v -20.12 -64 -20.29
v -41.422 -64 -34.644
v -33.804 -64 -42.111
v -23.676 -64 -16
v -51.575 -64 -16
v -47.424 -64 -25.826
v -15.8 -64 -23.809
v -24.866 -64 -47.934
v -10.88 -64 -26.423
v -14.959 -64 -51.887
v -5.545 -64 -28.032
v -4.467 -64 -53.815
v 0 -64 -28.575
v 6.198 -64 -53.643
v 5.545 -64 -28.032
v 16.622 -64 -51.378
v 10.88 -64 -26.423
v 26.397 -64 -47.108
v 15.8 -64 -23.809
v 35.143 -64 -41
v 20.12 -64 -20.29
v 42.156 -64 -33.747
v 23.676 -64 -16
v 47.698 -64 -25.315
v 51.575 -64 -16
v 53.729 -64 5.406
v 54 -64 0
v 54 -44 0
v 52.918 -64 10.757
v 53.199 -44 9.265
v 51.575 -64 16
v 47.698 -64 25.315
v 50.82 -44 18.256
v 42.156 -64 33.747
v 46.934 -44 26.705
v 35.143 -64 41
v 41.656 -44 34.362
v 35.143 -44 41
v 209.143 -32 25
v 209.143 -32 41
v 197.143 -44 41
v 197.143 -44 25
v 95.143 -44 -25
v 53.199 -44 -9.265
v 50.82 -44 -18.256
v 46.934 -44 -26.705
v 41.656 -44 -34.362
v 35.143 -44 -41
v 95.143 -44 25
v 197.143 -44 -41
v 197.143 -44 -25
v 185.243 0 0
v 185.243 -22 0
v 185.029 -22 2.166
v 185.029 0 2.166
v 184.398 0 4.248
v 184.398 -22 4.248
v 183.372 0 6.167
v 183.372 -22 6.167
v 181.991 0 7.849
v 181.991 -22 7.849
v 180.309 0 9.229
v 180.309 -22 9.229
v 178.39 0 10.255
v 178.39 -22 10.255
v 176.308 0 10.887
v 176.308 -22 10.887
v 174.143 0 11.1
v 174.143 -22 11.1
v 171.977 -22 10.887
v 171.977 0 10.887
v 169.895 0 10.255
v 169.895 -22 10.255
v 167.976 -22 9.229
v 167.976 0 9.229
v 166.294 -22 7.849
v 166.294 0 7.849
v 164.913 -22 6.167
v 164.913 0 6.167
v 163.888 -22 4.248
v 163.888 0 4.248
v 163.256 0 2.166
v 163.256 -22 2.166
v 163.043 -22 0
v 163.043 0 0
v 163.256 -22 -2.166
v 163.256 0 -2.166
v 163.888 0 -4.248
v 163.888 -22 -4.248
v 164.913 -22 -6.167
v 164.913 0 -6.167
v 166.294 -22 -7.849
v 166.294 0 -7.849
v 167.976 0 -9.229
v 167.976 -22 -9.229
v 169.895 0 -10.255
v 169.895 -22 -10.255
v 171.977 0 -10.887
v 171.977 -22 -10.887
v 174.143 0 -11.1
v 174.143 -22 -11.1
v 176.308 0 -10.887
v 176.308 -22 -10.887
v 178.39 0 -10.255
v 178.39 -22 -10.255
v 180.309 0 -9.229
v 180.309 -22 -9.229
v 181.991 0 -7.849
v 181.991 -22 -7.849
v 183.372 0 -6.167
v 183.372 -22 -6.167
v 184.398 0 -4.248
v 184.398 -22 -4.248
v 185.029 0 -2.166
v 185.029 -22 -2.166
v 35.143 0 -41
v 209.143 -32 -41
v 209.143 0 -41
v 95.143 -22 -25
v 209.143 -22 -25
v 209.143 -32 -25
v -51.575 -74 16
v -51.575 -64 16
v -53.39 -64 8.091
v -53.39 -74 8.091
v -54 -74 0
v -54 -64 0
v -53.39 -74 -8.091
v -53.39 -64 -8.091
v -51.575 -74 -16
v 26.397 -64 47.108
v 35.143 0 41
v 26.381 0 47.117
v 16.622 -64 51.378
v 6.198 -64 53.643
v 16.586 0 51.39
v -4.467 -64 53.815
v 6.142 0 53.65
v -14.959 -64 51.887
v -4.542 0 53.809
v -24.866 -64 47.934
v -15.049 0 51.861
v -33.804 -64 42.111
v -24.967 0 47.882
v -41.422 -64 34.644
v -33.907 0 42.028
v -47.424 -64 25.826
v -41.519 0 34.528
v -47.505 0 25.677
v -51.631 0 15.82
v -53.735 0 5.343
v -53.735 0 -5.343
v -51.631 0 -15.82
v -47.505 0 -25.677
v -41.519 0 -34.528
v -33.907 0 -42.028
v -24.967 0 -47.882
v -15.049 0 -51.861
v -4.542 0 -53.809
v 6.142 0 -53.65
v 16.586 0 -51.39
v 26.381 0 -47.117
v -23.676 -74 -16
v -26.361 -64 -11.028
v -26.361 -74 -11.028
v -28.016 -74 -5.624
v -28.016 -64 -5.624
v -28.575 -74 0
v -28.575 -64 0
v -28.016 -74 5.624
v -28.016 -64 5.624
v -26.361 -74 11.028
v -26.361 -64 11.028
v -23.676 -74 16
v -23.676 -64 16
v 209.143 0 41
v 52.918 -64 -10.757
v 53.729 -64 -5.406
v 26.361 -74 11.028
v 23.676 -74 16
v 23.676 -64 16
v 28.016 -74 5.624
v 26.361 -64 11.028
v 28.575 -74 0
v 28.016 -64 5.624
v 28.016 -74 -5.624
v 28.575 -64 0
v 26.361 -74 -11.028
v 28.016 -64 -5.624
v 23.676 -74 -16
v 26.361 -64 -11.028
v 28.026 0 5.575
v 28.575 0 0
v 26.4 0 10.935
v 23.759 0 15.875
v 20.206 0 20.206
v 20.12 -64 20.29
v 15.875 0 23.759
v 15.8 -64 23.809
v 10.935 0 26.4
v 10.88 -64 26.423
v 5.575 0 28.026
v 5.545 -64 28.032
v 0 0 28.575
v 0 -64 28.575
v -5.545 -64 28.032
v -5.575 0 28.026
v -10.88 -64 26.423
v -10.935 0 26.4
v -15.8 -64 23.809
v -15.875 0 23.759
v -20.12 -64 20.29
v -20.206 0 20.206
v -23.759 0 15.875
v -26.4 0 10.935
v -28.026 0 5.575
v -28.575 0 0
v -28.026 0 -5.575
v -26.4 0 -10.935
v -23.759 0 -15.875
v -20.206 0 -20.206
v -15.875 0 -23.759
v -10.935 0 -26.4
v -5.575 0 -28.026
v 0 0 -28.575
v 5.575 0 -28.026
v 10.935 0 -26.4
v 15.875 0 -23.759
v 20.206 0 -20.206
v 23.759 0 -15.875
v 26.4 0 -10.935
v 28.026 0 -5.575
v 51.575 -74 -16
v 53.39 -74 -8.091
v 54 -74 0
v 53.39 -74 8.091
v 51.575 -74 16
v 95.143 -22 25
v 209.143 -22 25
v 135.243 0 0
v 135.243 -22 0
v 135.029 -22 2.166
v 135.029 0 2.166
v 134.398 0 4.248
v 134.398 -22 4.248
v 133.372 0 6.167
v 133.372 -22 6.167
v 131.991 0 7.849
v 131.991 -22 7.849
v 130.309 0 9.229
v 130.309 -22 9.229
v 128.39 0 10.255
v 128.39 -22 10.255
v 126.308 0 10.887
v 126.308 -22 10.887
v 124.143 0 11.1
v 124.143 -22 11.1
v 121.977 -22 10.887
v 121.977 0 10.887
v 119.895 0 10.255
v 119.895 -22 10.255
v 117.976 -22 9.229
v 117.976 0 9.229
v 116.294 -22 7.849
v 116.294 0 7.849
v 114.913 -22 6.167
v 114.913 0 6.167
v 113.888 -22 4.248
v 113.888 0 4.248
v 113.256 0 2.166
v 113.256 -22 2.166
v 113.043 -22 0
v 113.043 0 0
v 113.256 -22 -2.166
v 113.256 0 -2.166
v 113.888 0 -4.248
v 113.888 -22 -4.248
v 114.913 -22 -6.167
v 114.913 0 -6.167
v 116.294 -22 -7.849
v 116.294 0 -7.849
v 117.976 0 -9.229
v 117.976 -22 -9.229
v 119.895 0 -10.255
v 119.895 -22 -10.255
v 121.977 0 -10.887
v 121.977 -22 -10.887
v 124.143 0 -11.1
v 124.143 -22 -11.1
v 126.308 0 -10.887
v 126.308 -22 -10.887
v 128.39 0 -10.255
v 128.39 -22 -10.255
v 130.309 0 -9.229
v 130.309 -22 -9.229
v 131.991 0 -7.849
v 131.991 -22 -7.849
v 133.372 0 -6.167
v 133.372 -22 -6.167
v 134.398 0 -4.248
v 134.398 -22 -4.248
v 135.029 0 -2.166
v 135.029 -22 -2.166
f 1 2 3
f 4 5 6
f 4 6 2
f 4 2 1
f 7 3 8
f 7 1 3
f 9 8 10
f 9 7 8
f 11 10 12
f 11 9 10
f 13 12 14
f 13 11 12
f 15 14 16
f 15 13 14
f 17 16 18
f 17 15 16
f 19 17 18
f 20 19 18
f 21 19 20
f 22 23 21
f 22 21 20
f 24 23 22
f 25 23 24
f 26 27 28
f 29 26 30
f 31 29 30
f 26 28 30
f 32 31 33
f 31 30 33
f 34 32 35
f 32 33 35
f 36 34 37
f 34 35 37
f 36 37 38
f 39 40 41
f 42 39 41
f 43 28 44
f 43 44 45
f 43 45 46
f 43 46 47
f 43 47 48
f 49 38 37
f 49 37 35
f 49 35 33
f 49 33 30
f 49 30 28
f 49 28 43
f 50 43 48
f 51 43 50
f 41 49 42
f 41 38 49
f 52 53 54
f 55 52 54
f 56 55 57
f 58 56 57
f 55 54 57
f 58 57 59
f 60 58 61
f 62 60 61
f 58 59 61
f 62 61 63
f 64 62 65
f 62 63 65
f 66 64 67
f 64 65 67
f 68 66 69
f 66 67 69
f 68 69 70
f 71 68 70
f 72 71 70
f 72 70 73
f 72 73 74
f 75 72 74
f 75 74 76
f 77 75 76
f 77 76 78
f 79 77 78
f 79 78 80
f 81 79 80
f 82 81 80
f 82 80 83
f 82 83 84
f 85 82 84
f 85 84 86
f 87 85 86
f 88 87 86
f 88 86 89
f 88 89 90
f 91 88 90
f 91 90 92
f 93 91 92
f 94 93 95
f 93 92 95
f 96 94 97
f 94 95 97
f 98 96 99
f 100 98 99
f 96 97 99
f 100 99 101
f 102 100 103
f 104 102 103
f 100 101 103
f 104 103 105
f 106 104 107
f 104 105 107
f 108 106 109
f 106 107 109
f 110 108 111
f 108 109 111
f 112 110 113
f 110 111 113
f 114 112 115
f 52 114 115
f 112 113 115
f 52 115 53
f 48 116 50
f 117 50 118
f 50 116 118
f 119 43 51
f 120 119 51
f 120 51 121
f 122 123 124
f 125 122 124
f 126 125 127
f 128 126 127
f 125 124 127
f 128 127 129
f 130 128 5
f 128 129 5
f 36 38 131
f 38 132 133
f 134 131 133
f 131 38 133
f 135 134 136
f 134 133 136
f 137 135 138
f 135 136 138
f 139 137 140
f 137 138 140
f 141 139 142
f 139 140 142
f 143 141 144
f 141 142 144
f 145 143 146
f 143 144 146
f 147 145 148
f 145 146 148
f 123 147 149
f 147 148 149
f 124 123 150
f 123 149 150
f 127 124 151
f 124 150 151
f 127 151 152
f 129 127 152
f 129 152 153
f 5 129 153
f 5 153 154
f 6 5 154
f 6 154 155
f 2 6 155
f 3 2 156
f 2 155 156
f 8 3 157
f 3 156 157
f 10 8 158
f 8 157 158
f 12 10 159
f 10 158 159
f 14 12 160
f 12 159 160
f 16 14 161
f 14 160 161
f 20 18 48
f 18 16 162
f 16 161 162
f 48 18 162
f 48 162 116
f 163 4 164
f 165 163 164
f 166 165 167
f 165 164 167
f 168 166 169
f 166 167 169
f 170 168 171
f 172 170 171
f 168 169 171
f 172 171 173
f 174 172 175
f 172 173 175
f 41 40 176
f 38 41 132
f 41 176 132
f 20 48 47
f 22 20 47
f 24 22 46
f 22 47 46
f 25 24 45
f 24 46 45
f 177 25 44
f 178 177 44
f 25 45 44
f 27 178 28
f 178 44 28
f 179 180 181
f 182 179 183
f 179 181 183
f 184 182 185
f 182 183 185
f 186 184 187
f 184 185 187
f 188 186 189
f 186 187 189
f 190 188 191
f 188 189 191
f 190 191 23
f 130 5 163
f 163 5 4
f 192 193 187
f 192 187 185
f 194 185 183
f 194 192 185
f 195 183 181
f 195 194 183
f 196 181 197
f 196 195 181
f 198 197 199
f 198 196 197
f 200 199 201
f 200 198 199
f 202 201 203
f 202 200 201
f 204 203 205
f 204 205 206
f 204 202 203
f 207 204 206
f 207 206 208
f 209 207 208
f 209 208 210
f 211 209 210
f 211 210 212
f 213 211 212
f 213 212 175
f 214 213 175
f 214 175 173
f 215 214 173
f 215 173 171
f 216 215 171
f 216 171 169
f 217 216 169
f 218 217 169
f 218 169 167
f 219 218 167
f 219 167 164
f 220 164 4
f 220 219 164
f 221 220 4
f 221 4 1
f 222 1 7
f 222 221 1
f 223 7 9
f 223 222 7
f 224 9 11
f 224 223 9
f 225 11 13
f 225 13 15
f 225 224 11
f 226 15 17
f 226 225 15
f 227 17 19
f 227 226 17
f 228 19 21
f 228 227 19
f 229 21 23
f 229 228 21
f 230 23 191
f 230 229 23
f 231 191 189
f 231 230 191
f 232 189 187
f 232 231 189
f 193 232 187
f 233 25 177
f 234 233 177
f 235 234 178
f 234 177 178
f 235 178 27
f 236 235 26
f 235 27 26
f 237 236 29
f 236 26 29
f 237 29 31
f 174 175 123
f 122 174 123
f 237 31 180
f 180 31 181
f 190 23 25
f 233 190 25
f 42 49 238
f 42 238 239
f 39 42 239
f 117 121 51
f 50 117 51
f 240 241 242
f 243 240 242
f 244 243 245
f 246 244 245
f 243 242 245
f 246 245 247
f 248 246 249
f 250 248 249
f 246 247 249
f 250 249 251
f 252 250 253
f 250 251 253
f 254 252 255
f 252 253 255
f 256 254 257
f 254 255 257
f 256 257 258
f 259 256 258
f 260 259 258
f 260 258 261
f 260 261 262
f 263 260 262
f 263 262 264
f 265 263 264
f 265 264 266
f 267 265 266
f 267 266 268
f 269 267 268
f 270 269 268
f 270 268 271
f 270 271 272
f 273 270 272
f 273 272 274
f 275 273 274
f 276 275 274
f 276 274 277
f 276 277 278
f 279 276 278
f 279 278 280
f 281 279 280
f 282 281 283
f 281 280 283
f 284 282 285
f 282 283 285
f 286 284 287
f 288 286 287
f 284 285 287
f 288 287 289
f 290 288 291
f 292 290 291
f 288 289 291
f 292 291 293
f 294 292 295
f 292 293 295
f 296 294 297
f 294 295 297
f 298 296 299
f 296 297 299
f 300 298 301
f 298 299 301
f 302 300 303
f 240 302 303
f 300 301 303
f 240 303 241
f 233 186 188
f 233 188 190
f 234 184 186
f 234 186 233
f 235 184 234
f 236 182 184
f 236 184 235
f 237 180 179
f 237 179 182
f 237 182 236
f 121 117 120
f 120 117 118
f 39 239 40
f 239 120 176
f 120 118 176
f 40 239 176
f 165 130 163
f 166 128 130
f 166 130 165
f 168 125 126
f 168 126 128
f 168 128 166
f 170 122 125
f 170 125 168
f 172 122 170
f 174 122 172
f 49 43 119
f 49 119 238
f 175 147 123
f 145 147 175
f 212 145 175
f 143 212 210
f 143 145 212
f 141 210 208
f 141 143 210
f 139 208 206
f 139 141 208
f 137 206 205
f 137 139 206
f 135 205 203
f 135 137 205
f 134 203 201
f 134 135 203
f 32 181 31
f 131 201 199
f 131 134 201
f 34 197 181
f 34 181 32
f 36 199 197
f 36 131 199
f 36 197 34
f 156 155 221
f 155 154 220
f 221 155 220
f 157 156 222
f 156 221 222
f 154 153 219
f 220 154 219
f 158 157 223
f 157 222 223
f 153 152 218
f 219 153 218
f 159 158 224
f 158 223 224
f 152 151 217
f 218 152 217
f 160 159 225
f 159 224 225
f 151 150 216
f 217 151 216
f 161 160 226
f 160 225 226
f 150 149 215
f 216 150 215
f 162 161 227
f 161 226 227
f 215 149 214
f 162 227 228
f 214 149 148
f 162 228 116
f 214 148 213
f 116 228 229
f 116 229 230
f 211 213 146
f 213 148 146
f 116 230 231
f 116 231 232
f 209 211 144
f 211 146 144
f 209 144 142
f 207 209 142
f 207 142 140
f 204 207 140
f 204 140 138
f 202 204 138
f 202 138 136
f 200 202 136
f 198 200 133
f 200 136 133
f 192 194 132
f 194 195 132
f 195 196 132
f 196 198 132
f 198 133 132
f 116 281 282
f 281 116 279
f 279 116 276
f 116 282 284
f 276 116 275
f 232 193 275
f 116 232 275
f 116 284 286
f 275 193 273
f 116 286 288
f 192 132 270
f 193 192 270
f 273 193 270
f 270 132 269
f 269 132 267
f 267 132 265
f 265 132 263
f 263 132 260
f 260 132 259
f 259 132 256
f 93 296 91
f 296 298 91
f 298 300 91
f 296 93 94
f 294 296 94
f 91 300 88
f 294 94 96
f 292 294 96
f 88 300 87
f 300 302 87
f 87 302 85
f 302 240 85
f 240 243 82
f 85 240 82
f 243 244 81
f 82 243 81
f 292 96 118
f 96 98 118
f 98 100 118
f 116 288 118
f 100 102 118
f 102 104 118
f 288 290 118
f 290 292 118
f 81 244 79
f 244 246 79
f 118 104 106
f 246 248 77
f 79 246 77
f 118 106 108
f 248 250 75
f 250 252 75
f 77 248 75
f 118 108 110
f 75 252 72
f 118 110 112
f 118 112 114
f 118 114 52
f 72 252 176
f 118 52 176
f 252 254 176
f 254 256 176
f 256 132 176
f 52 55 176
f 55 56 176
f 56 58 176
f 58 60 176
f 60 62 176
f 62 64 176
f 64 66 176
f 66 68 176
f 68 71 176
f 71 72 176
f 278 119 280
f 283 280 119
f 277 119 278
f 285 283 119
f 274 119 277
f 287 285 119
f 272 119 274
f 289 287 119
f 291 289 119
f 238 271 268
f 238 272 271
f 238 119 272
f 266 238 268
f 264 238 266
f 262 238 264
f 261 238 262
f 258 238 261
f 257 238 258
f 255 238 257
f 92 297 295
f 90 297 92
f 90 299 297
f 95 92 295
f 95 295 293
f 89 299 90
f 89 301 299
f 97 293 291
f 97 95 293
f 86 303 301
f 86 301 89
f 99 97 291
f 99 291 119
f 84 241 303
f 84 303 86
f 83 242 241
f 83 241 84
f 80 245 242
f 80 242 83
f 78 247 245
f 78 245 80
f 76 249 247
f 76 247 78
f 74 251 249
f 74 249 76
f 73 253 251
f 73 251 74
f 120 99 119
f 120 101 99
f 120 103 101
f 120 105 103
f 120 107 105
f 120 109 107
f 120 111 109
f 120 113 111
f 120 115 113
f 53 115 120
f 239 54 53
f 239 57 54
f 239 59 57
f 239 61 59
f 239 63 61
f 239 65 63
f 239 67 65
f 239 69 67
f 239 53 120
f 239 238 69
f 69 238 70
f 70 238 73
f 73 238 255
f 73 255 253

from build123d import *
from build123d import SkipClean  # not in build123d's __all__

# Parameters (mm, degrees)
F0_R          = 28.575
F1_DEPTH      = 64
F2_DEPTH      = 44
F4_W          = 114
F4_H          = 50
F5_DEPTH      = 22
F6_DEPTH      = 95.001
F6_DEPTH_BACK = 25
F7_R          = 11.1
F8_DEPTH      = 22.001
F10_DEPTH     = 10
F12_DEPTH     = 10


# Not quite as in the source:
# - after a boolean that leaves OpenCascade's solid faulty, fix() repairs it


with BuildPart() as f1:
    # F0 (on Front) → F1 (new body)
    with BuildSketch(Plane.XZ):
        with BuildLine():
            ThreePointArc((35.1425667816, -41), (49.0596504584, -22.5643678594), (54, 0))
            ThreePointArc((54, 0), (49.0596504584, 22.5643678594), (35.1425667816, 41))
            ThreePointArc((35.1425667816, 41), (-54, 0), (35.1425667816, -41))
        make_face()
        Circle(F0_R, mode=Mode.SUBTRACT)
    extrude(amount=F1_DEPTH)

    # F0 (on Front) → F2 (join)
    with BuildSketch(Plane.XZ):
        with BuildLine():
            ThreePointArc((35.1425667816, 41), (49.0596504584, 22.5643678594), (54, 0))
            ThreePointArc((54, 0), (49.0596504584, -22.5643678594), (35.1425667816, -41))
            Line((35.1425667816, -41), (209.1425667816, -41))
            Line((209.1425667816, -41), (209.1425667816, 41))
            Line((209.1425667816, 41), (35.1425667816, 41))
        make_face()
    extrude(amount=F2_DEPTH)

    # F4 (on face) → F5 (cut)
    with BuildSketch(Plane.XZ.offset(44)):
        with Locations((152.1425667816, 0)):
            Rectangle(F4_W, F4_H)
    extrude(amount=-F5_DEPTH, mode=Mode.SUBTRACT)

    # F3 (on face) → F6 (cut, two sides)
    with BuildSketch(Plane.XY.offset(41)) as f6_sk:
        Polygon((209.1425667816, -32), (197.1425667816, -44), (209.1425667816, -44), align=None)
    extrude(amount=-F6_DEPTH, mode=Mode.SUBTRACT)
    extrude(f6_sk.sketch, amount=F6_DEPTH_BACK, mode=Mode.SUBTRACT)

    # F7 (on face) → F8 (cut, through all)
    with BuildSketch(Plane.XZ.offset(22)):
        with Locations((124.1425667816, 0)):
            Circle(F7_R)
        with Locations((174.1425667816, 0)):
            Circle(F7_R)
    extrude(amount=-F8_DEPTH, mode=Mode.SUBTRACT)

    # F9 (on face) → F10 (join)
    with BuildSketch(Plane.XZ.offset(64)):
        with BuildLine():
            ThreePointArc((-23.6755279772, -16), (-28.575, 0), (-23.6755279772, 16))
            Line((-23.6755279772, 16), (-51.5751878329, 16))
            ThreePointArc((-51.5751878329, 16), (-54, 0), (-51.5751878329, -16))
            Line((-51.5751878329, -16), (-23.6755279772, -16))
        make_face()
    extrude(amount=F10_DEPTH)

    add(f1.part.fix(), mode=Mode.REPLACE)

    # F11 (on face) → F12 (join)
    with BuildSketch(Plane.XZ.offset(64)):
        with BuildLine():
            ThreePointArc((23.6755279772, 16), (28.575, 0), (23.6755279772, -16))
            Line((23.6755279772, -16), (51.5751878329, -16))
            ThreePointArc((51.5751878329, -16), (54, 0), (51.5751878329, 16))
            Line((51.5751878329, 16), (23.6755279772, 16))
        make_face()
    with SkipClean():  # cleaning this boolean's faces spoils the solid; the shape is the same uncleaned
        extrude(amount=F12_DEPTH)


solid = f1.part
